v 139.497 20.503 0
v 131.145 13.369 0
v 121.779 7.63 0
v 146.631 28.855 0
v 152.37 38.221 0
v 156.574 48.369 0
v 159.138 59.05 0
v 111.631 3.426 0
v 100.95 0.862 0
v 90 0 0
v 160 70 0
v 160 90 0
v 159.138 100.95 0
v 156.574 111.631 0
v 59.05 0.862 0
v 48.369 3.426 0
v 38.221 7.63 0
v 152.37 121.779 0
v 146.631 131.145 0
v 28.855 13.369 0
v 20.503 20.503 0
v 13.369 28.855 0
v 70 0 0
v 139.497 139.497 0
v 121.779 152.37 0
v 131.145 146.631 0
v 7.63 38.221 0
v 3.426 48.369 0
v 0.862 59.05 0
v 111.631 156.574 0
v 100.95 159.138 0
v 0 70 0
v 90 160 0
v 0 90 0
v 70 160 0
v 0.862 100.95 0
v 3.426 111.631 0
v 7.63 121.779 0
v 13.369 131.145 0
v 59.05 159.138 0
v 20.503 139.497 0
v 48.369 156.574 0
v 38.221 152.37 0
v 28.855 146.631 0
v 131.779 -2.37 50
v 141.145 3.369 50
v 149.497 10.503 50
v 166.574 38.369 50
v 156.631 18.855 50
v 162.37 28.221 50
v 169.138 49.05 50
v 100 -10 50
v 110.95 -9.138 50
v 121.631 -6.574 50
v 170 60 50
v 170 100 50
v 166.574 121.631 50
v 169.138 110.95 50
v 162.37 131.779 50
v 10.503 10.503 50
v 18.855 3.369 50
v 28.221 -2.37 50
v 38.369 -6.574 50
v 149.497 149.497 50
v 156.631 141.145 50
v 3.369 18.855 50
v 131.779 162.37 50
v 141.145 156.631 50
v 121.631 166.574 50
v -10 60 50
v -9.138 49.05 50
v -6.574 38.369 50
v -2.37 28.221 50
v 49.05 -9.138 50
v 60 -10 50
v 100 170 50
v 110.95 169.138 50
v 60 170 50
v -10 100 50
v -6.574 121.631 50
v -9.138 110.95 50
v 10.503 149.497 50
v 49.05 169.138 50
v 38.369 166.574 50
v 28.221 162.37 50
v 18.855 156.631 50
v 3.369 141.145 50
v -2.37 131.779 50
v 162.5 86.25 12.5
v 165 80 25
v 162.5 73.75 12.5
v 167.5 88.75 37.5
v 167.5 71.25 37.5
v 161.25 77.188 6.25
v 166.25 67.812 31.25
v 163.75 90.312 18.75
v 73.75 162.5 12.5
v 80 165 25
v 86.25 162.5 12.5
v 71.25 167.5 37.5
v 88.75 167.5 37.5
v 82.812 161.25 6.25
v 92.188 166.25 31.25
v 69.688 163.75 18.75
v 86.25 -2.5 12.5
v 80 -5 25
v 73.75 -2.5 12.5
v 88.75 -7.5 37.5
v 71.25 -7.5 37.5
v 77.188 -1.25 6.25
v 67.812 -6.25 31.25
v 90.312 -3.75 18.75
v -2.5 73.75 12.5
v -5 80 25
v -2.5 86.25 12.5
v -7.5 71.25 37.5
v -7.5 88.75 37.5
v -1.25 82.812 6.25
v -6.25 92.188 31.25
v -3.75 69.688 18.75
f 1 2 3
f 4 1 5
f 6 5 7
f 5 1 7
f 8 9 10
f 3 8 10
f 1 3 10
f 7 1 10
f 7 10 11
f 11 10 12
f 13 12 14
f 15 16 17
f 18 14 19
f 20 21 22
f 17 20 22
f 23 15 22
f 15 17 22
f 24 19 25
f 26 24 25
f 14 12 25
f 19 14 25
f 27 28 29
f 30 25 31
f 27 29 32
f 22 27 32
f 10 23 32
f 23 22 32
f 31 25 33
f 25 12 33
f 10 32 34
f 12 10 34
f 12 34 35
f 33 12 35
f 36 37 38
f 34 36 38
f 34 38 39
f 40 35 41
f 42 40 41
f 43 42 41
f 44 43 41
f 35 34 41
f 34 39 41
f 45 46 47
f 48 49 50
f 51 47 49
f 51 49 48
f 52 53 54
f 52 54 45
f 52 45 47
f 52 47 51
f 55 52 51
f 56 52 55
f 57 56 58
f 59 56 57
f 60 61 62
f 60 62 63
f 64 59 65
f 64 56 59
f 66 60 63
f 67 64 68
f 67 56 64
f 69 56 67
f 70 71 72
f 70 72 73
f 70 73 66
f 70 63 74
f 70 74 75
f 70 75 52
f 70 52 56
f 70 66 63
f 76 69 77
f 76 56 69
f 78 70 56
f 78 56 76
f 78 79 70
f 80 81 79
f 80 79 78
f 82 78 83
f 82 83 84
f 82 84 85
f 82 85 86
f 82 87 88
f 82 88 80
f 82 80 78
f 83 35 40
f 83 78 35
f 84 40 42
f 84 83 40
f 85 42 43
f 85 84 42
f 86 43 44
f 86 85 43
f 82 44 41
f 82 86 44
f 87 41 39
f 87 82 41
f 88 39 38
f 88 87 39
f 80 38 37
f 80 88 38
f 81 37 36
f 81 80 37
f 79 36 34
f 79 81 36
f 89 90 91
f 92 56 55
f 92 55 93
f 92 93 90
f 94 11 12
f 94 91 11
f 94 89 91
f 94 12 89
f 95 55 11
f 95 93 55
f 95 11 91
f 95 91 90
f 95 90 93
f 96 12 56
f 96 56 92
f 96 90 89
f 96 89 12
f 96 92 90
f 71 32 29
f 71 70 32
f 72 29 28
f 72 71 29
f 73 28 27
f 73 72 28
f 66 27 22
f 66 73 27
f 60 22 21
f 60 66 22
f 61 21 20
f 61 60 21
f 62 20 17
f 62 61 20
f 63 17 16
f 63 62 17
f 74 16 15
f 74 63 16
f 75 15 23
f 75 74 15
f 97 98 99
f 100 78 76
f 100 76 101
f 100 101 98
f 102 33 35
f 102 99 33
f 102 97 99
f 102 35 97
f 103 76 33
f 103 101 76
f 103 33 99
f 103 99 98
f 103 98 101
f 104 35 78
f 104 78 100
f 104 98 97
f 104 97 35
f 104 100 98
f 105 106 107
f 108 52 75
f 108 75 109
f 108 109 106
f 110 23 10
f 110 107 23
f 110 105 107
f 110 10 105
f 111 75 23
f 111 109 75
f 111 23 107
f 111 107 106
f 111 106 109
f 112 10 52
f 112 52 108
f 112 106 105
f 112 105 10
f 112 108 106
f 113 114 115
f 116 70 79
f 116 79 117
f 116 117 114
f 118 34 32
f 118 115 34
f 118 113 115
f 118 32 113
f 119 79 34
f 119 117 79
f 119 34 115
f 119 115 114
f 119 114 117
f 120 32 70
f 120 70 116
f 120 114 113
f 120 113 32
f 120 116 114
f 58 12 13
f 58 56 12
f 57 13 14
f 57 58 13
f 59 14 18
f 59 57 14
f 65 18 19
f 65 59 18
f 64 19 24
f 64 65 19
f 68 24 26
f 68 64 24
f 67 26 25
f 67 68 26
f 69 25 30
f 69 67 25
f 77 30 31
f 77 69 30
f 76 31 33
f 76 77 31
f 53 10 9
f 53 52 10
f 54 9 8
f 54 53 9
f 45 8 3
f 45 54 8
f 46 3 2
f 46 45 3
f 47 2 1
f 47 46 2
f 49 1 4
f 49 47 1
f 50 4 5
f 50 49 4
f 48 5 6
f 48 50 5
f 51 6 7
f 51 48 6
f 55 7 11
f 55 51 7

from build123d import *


with BuildPart() as part:
    # Face → Loft section 0
    with BuildSketch(Plane(origin=(80, 80, 0), x_dir=(0, 1, 0), z_dir=(0, 0, 1))):
        with BuildLine():
            ThreePointArc((80, 10), (59.497475, 59.497475), (10, 80))
            Line((10, 80), (-10, 80))
            ThreePointArc((-10, 80), (-59.497475, 59.497475), (-80, 10))
            Line((-80, 10), (-80, -10))
            ThreePointArc((-80, -10), (-59.497475, -59.497475), (-10, -80))
            Line((-10, -80), (10, -80))
            ThreePointArc((10, -80), (59.497475, -59.497475), (80, -10))
            Line((80, -10), (80, 10))
        make_face()
    # Face001 → Loft section 1
    with BuildSketch(Plane(origin=(80, 80, 50), x_dir=(0, 1, 0), z_dir=(0, 0, 1))):
        with BuildLine():
            ThreePointArc((-20, 90), (-69.497475, 69.497475), (-90, 20))
            Line((-90, 20), (-90, -20))
            ThreePointArc((-90, -20), (-69.497475, -69.497475), (-20, -90))
            Line((-20, -90), (20, -90))
            ThreePointArc((20, -90), (69.497475, -69.497475), (90, -20))
            Line((90, -20), (90, 20))
            ThreePointArc((90, 20), (69.497475, 69.497475), (20, 90))
            Line((20, 90), (-20, 90))
        make_face()
    loft()


solid = part.part
